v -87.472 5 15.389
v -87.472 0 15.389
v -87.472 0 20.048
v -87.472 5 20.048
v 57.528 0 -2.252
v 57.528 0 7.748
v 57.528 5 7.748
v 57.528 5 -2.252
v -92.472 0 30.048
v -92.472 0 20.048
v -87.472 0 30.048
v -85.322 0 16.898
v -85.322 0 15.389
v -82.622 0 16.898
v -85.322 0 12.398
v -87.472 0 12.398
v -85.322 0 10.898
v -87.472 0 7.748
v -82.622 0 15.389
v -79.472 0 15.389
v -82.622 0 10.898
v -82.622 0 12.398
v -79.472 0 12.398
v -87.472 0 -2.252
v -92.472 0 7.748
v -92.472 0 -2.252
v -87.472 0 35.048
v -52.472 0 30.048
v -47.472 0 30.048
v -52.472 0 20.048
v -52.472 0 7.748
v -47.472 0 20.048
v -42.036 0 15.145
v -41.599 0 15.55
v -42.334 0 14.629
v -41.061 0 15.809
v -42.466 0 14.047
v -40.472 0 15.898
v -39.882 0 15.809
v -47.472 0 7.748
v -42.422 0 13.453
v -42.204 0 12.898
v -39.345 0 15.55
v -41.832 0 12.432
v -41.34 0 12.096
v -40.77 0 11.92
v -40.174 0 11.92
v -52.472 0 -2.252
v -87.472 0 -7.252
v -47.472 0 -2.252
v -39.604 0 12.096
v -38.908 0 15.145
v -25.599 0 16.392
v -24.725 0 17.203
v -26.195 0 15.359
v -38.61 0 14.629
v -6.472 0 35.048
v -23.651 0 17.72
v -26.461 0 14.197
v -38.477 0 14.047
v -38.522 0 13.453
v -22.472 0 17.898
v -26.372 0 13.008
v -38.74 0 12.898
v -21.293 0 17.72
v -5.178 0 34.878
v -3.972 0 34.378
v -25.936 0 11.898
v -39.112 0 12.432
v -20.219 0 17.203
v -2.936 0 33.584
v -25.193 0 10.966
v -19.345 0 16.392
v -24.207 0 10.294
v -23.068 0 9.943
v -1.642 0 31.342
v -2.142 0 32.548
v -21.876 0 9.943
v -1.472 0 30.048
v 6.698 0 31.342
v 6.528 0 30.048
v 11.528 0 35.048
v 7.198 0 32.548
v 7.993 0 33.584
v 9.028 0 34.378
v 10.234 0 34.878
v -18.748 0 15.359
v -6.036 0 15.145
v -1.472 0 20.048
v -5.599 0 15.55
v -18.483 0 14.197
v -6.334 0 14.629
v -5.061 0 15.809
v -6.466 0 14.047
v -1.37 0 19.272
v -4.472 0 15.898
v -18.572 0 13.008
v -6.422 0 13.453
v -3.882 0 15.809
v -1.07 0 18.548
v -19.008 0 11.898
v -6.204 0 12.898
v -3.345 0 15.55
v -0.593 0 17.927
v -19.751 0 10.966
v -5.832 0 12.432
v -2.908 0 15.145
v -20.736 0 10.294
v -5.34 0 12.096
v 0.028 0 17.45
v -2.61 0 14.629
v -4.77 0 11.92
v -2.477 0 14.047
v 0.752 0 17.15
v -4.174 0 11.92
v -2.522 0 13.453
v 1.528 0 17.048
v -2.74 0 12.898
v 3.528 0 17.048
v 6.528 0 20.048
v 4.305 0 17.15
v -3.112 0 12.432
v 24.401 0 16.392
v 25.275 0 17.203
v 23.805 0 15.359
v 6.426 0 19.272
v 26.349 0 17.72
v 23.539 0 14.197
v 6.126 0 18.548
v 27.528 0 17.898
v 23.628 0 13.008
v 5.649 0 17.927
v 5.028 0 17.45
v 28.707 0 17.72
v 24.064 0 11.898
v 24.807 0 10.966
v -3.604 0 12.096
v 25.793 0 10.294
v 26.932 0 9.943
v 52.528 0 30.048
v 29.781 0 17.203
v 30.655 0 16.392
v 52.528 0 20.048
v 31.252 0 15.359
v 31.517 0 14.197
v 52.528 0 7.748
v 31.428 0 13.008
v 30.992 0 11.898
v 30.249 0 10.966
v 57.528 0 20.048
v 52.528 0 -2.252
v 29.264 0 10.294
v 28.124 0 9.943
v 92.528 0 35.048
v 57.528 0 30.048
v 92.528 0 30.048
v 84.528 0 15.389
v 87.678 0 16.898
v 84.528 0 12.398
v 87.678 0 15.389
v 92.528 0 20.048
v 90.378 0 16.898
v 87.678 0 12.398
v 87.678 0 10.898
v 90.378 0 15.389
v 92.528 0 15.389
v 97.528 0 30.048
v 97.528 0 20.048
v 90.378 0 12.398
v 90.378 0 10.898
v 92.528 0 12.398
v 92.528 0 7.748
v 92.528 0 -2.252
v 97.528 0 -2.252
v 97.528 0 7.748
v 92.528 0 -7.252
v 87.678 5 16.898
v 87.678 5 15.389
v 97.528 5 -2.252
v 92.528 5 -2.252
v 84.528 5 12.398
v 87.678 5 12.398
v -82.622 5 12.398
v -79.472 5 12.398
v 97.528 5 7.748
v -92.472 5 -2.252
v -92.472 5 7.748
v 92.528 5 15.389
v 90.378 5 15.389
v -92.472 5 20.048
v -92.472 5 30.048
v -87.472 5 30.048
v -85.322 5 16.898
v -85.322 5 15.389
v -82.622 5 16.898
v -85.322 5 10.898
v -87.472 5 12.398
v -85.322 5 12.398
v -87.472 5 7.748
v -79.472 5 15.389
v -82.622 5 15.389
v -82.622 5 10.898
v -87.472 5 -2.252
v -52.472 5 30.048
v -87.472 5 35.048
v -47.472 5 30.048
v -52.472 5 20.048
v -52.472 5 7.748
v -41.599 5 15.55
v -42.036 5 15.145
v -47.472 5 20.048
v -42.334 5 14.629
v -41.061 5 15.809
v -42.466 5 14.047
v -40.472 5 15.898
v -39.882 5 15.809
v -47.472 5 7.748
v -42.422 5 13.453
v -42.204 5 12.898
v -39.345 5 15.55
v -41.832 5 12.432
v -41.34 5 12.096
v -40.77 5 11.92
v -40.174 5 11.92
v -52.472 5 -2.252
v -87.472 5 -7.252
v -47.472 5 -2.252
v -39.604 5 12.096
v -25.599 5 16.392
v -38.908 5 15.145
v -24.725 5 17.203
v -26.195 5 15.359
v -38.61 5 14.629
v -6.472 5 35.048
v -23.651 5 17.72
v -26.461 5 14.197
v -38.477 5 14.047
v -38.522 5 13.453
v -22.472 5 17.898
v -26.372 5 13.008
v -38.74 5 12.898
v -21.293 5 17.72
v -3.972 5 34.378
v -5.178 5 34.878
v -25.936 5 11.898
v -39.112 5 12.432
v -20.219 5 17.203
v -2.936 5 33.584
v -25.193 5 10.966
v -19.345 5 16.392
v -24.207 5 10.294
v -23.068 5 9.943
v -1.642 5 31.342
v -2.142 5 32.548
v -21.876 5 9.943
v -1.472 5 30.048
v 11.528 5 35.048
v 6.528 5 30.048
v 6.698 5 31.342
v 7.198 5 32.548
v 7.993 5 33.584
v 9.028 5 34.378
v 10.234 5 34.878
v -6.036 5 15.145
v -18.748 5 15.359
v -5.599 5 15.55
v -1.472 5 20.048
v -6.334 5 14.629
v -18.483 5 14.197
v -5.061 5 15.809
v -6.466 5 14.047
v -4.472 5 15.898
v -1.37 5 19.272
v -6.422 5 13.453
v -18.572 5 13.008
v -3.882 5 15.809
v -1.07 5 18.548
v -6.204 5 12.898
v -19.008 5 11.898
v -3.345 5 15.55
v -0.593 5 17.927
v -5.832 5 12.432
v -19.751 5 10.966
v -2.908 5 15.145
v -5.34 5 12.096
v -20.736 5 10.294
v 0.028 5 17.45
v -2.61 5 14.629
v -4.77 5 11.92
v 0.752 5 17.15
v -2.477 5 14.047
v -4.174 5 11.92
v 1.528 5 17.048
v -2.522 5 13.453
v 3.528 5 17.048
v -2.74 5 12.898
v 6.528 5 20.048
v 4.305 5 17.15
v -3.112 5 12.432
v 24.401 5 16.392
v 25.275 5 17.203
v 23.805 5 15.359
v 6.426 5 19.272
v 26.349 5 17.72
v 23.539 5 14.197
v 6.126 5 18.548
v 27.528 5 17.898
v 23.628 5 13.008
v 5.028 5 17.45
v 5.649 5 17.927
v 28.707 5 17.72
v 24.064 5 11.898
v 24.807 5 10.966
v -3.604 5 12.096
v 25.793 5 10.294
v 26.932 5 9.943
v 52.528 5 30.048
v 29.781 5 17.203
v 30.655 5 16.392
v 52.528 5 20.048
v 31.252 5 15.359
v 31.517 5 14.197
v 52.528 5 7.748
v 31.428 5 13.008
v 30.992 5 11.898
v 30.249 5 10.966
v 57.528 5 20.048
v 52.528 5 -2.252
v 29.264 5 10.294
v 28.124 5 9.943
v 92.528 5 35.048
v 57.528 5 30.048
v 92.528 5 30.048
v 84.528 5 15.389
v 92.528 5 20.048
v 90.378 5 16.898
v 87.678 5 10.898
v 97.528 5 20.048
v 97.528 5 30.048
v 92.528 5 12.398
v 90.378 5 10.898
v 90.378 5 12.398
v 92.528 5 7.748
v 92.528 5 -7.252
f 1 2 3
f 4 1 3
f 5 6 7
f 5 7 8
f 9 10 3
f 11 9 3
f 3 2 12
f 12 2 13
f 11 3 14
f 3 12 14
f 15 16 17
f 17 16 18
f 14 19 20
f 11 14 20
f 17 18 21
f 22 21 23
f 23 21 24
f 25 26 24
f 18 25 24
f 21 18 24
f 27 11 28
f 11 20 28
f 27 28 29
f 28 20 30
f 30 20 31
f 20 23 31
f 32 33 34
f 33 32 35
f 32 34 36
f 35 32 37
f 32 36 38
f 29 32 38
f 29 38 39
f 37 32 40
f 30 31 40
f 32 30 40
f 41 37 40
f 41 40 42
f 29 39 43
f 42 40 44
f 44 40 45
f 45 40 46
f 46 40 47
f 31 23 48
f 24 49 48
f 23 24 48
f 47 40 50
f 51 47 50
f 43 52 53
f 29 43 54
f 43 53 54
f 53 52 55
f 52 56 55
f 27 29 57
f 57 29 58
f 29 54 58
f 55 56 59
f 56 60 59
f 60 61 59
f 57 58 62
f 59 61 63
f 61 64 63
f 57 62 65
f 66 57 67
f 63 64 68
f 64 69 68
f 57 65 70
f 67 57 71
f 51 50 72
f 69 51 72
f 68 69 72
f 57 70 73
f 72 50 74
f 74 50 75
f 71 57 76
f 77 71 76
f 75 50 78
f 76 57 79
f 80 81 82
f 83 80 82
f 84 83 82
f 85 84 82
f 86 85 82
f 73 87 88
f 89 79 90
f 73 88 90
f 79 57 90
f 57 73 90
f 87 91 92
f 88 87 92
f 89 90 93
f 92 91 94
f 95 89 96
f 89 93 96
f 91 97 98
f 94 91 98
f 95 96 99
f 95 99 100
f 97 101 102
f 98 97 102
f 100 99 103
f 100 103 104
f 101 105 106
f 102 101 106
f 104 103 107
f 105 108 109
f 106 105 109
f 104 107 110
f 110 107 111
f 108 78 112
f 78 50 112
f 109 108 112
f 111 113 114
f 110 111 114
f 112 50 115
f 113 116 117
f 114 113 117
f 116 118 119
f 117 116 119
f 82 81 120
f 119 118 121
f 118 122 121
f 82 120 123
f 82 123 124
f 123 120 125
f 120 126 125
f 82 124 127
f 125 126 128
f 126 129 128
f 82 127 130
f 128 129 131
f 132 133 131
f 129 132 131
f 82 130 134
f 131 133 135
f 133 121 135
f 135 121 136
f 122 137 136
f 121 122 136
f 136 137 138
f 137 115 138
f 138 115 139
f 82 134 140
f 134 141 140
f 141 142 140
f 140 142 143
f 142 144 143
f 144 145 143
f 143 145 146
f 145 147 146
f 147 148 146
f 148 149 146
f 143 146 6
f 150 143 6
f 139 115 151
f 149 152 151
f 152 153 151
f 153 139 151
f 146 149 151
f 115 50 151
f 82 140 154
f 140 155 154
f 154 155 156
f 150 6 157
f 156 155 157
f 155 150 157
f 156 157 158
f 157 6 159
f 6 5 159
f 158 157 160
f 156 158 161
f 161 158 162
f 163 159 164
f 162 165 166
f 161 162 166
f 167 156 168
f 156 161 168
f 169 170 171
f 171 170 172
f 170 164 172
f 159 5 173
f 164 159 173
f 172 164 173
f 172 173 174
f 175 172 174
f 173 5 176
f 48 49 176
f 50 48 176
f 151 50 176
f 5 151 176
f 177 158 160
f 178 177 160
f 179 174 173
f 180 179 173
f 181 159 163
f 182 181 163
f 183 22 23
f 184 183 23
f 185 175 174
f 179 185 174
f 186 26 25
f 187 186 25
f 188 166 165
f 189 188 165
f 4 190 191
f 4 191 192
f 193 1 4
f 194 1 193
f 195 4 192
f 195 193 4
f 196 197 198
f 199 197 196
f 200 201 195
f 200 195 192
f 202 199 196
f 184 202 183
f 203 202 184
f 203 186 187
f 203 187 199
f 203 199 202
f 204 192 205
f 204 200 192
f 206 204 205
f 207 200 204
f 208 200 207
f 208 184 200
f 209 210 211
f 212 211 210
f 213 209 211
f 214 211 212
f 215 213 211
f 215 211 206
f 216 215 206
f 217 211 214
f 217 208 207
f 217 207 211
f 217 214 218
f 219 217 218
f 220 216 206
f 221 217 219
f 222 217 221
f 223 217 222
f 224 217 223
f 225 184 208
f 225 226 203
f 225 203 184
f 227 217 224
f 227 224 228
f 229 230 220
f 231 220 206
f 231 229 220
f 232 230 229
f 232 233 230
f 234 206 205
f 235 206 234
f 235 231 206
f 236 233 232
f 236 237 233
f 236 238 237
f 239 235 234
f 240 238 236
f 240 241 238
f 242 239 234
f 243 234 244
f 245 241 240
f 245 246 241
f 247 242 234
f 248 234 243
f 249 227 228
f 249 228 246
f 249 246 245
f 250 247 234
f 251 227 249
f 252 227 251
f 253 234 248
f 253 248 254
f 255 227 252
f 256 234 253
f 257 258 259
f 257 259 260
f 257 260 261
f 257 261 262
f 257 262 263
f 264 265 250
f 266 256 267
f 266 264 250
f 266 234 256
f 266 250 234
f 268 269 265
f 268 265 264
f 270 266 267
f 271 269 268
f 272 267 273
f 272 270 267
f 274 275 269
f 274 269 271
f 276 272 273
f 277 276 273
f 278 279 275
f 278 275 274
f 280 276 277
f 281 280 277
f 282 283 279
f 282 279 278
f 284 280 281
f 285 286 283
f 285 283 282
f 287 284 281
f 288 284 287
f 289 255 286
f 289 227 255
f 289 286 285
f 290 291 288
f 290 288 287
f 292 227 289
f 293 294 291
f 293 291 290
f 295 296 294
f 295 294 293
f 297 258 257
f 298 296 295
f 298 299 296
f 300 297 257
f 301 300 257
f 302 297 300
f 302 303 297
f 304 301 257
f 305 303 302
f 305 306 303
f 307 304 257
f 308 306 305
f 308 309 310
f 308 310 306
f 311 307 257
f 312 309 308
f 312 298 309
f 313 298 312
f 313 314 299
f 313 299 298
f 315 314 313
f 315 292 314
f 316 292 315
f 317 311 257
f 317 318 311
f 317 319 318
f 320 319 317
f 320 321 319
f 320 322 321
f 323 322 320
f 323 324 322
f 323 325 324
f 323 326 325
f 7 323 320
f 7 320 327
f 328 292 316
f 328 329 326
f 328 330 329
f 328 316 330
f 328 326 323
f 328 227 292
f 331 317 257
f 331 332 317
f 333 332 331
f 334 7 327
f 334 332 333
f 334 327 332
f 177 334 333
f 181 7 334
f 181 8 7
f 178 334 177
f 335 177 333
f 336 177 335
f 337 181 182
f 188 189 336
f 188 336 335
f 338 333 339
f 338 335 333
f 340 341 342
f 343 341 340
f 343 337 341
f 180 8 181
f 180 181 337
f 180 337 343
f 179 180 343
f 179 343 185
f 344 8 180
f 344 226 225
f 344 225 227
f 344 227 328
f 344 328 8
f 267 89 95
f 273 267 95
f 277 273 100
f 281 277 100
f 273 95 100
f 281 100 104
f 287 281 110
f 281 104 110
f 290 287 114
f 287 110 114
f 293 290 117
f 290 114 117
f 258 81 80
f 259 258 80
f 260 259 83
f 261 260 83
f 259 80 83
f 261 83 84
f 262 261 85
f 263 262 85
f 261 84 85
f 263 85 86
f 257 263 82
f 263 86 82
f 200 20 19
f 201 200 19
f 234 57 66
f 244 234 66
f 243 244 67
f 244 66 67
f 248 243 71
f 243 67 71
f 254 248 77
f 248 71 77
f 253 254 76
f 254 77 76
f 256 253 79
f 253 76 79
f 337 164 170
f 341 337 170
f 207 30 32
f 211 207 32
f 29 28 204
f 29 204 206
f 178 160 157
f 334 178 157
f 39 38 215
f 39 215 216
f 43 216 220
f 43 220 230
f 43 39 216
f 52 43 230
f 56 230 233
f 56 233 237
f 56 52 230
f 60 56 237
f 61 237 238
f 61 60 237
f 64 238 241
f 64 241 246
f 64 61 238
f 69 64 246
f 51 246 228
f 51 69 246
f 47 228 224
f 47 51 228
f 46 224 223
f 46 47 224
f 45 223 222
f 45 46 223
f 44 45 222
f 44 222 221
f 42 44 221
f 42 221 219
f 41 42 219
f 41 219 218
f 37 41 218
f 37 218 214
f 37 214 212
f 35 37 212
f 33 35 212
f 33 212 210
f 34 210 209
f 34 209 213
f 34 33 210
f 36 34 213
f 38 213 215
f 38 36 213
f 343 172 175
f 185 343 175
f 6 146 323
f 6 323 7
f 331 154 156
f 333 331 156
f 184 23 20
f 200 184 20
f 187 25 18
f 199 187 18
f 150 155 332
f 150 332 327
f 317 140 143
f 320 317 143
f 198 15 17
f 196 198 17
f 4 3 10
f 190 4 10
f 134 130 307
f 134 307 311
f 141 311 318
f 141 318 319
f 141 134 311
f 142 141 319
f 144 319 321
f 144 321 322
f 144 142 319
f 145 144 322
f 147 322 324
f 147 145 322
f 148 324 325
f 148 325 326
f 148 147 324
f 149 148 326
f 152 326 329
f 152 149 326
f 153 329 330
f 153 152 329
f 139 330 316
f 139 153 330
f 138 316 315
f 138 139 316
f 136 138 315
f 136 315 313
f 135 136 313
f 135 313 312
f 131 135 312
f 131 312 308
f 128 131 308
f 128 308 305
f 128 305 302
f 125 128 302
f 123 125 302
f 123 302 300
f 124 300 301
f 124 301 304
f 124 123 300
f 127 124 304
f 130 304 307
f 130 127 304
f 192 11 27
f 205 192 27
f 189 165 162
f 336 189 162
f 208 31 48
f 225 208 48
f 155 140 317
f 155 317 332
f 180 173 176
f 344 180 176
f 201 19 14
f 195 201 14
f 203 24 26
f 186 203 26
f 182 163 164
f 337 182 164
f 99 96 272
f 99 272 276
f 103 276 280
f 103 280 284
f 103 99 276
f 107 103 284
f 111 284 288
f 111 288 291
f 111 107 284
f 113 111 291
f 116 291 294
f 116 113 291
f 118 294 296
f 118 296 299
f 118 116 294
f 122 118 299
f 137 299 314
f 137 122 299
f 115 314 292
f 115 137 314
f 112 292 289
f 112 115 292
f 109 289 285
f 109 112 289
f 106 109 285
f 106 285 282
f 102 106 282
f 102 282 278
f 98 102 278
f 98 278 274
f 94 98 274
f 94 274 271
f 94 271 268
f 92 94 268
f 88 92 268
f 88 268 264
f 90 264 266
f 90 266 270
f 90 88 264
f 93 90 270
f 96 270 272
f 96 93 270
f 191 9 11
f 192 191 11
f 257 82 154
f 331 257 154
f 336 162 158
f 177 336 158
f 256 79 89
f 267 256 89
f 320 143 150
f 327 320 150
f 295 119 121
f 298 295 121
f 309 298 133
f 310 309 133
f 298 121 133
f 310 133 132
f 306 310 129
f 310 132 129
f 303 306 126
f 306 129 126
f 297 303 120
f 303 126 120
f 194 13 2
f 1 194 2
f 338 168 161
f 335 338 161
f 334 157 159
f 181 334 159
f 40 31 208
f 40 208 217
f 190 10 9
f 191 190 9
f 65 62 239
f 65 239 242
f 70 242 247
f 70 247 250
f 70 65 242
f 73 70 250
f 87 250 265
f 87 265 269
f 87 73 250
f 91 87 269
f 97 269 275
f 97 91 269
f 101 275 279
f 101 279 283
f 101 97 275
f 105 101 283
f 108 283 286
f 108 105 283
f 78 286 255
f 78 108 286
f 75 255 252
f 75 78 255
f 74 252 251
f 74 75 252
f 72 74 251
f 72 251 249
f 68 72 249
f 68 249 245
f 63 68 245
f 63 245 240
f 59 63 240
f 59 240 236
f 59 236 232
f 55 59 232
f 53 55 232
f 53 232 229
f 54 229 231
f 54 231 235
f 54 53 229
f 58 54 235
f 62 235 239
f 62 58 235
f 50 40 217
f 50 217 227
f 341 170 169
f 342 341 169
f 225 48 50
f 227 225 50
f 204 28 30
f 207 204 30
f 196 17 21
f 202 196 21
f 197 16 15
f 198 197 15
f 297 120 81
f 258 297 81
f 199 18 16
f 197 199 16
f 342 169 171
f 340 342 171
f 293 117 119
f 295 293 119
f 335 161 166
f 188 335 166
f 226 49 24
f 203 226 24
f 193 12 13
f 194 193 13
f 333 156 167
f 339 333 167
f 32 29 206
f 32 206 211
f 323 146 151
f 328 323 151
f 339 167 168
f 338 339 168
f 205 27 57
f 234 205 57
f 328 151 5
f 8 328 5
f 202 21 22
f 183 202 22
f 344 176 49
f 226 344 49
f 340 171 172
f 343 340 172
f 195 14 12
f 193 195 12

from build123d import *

# Parameters (mm, degrees)
SKETCH_1_R      = 4
SKETCH_1_R_2    = 2
SKETCH_1_W      = 5
SKETCH_1_H      = 10
EXTRUDE_1_DEPTH = 5


with BuildPart() as part:
    # 草图1 → 凸台-拉伸1 (new body)
    with BuildSketch(Plane(origin=(0, 0, 0), x_dir=(1, 0, 0), z_dir=(0, 1, 0))):
        with BuildLine():
            Line((-87.471894738, -35.047998618), (-6.471894738, -35.047998618))
            ThreePointArc((-6.471894738, -35.047998618), (-2.936360832, -33.583532524), (-1.471894738, -30.047998618))
            Line((-1.471894738, -30.047998618), (-1.471894738, -20.047998618))
            ThreePointArc((-1.471894738, -20.047998618), (-0.593215082, -17.926678275), (1.528105262, -17.047998618))
            Line((1.528105262, -17.047998618), (3.528105262, -17.047998618))
            ThreePointArc((3.528105262, -17.047998618), (5.649425606, -17.926678275), (6.528105262, -20.047998618))
            Line((6.528105262, -20.047998618), (6.528105262, -30.047998618))
            ThreePointArc((6.528105262, -30.047998618), (7.992571356, -33.583532524), (11.528105262, -35.047998618))
            Line((11.528105262, -35.047998618), (92.528105262, -35.047998618))
            Line((92.528105262, -35.047998618), (92.528105262, -30.047998618))
            Line((92.528105262, -30.047998618), (97.528105262, -30.047998618))
            Line((97.528105262, -30.047998618), (97.528105262, -20.047998618))
            Line((97.528105262, -20.047998618), (92.528105262, -20.047998618))
            Line((92.528105262, -20.047998618), (92.528105262, -15.388953653))
            Line((92.528105262, -15.388953653), (90.378105262, -15.388953653))
            Line((90.378105262, -15.388953653), (90.378105262, -16.897998618))
            Line((90.378105262, -16.897998618), (87.678105262, -16.897998618))
            Line((87.678105262, -16.897998618), (87.678105262, -15.388953653))
            Line((87.678105262, -15.388953653), (84.528105262, -15.388953653))
            Line((84.528105262, -15.388953653), (84.528105262, -12.397998618))
            Line((84.528105262, -12.397998618), (87.678105262, -12.397998618))
            Line((87.678105262, -12.397998618), (87.678105262, -10.897998618))
            Line((87.678105262, -10.897998618), (90.378105262, -10.897998618))
            Line((90.378105262, -10.897998618), (90.378105262, -12.397998618))
            Line((90.378105262, -12.397998618), (92.528105262, -12.397998618))
            Line((92.528105262, -12.397998618), (92.528105262, -7.747998618))
            Line((92.528105262, -7.747998618), (97.528105262, -7.747998618))
            Line((97.528105262, -7.747998618), (97.528105262, 2.252001382))
            Line((97.528105262, 2.252001382), (92.528105262, 2.252001382))
            Line((92.528105262, 2.252001382), (92.528105262, 7.252001382))
            Line((92.528105262, 7.252001382), (-87.471894738, 7.252001382))
            Line((-87.471894738, 7.252001382), (-87.471894738, 2.252001382))
            Line((-87.471894738, 2.252001382), (-92.471894738, 2.252001382))
            Line((-92.471894738, 2.252001382), (-92.471894738, -7.747998618))
            Line((-92.471894738, -7.747998618), (-87.471894738, -7.747998618))
            Line((-87.471894738, -7.747998618), (-87.471894738, -12.397998618))
            Line((-87.471894738, -12.397998618), (-85.321894738, -12.397998618))
            Line((-85.321894738, -12.397998618), (-85.321894738, -10.897998618))
            Line((-85.321894738, -10.897998618), (-82.621894738, -10.897998618))
            Line((-82.621894738, -10.897998618), (-82.621894738, -12.397998618))
            Line((-82.621894738, -12.397998618), (-79.471894738, -12.397998618))
            Line((-79.471894738, -12.397998618), (-79.471894738, -15.388953653))
            Line((-79.471894738, -15.388953653), (-82.621894738, -15.388953653))
            Line((-82.621894738, -15.388953653), (-82.621894738, -16.897998618))
            Line((-82.621894738, -16.897998618), (-85.321894738, -16.897998618))
            Line((-85.321894738, -16.897998618), (-85.321894738, -15.388953653))
            Line((-85.321894738, -15.388953653), (-87.471894738, -15.388953653))
            Line((-87.471894738, -15.388953653), (-87.471894738, -20.047998618))
            Line((-87.471894738, -20.047998618), (-92.471894738, -20.047998618))
            Line((-92.471894738, -20.047998618), (-92.471894738, -30.047998618))
            Line((-92.471894738, -30.047998618), (-87.471894738, -30.047998618))
            Line((-87.471894738, -30.047998618), (-87.471894738, -35.047998618))
        make_face()
        with Locations(Location((-22.471894738, -13.897998618, 0), (0, 0, 270))):
            Circle(SKETCH_1_R, mode=Mode.SUBTRACT)
        with Locations(Location((27.528105262, -13.897998618, 0), (0, 0, 270))):
            Circle(SKETCH_1_R, mode=Mode.SUBTRACT)
        with Locations(Location((-40.471894738, -13.897998618, 0), (0, 0, 270))):
            Circle(SKETCH_1_R_2, mode=Mode.SUBTRACT)
        with Locations(Location((-4.471894738, -13.897998618, 0), (0, 0, 270))):
            Circle(SKETCH_1_R_2, mode=Mode.SUBTRACT)
        with Locations((-49.971894738, -2.747998618)):
            Rectangle(SKETCH_1_W, SKETCH_1_H, mode=Mode.SUBTRACT)
        with Locations((-49.971894738, -25.047998618)):
            Rectangle(SKETCH_1_W, SKETCH_1_H, mode=Mode.SUBTRACT)
        with Locations((55.028105262, -25.047998618)):
            Rectangle(SKETCH_1_W, SKETCH_1_H, mode=Mode.SUBTRACT)
        with Locations((55.028105262, -2.747998618)):
            Rectangle(SKETCH_1_W, SKETCH_1_H, mode=Mode.SUBTRACT)
    extrude(amount=EXTRUDE_1_DEPTH)


solid = part.part
